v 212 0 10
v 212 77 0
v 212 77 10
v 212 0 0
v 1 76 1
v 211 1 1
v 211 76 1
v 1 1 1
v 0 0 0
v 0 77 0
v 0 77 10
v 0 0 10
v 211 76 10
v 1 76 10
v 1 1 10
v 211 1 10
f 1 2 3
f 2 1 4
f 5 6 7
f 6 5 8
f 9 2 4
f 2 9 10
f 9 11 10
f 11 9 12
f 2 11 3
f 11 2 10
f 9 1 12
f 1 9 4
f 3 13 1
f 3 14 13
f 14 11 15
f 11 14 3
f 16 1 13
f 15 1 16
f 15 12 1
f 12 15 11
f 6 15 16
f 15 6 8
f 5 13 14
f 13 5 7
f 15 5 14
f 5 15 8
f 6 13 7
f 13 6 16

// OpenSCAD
// Dimensions
trayLength = 210;
trayWidth = 75;
trayHeight = 1;

wallHeight = 10;
wallDepth = 1;

// Model
// Tray Base
cube([trayLength + (2 * wallDepth), trayWidth + (2 * wallDepth), trayHeight]);
// Tray Walls (Long Sides)
cube([trayLength + (2 * wallDepth), wallDepth, wallHeight]);
translate([0,trayWidth + wallDepth, 0]) {
    cube([trayLength + (2 * wallDepth), wallDepth, wallHeight]);
}
// Tray Walls (Short Sides)
cube([wallDepth, trayWidth + (2 * wallDepth), wallHeight]);
translate([trayLength + wallDepth, 0, 0]) {
    cube([wallDepth, trayWidth + (2 * wallDepth), wallHeight]);
}
